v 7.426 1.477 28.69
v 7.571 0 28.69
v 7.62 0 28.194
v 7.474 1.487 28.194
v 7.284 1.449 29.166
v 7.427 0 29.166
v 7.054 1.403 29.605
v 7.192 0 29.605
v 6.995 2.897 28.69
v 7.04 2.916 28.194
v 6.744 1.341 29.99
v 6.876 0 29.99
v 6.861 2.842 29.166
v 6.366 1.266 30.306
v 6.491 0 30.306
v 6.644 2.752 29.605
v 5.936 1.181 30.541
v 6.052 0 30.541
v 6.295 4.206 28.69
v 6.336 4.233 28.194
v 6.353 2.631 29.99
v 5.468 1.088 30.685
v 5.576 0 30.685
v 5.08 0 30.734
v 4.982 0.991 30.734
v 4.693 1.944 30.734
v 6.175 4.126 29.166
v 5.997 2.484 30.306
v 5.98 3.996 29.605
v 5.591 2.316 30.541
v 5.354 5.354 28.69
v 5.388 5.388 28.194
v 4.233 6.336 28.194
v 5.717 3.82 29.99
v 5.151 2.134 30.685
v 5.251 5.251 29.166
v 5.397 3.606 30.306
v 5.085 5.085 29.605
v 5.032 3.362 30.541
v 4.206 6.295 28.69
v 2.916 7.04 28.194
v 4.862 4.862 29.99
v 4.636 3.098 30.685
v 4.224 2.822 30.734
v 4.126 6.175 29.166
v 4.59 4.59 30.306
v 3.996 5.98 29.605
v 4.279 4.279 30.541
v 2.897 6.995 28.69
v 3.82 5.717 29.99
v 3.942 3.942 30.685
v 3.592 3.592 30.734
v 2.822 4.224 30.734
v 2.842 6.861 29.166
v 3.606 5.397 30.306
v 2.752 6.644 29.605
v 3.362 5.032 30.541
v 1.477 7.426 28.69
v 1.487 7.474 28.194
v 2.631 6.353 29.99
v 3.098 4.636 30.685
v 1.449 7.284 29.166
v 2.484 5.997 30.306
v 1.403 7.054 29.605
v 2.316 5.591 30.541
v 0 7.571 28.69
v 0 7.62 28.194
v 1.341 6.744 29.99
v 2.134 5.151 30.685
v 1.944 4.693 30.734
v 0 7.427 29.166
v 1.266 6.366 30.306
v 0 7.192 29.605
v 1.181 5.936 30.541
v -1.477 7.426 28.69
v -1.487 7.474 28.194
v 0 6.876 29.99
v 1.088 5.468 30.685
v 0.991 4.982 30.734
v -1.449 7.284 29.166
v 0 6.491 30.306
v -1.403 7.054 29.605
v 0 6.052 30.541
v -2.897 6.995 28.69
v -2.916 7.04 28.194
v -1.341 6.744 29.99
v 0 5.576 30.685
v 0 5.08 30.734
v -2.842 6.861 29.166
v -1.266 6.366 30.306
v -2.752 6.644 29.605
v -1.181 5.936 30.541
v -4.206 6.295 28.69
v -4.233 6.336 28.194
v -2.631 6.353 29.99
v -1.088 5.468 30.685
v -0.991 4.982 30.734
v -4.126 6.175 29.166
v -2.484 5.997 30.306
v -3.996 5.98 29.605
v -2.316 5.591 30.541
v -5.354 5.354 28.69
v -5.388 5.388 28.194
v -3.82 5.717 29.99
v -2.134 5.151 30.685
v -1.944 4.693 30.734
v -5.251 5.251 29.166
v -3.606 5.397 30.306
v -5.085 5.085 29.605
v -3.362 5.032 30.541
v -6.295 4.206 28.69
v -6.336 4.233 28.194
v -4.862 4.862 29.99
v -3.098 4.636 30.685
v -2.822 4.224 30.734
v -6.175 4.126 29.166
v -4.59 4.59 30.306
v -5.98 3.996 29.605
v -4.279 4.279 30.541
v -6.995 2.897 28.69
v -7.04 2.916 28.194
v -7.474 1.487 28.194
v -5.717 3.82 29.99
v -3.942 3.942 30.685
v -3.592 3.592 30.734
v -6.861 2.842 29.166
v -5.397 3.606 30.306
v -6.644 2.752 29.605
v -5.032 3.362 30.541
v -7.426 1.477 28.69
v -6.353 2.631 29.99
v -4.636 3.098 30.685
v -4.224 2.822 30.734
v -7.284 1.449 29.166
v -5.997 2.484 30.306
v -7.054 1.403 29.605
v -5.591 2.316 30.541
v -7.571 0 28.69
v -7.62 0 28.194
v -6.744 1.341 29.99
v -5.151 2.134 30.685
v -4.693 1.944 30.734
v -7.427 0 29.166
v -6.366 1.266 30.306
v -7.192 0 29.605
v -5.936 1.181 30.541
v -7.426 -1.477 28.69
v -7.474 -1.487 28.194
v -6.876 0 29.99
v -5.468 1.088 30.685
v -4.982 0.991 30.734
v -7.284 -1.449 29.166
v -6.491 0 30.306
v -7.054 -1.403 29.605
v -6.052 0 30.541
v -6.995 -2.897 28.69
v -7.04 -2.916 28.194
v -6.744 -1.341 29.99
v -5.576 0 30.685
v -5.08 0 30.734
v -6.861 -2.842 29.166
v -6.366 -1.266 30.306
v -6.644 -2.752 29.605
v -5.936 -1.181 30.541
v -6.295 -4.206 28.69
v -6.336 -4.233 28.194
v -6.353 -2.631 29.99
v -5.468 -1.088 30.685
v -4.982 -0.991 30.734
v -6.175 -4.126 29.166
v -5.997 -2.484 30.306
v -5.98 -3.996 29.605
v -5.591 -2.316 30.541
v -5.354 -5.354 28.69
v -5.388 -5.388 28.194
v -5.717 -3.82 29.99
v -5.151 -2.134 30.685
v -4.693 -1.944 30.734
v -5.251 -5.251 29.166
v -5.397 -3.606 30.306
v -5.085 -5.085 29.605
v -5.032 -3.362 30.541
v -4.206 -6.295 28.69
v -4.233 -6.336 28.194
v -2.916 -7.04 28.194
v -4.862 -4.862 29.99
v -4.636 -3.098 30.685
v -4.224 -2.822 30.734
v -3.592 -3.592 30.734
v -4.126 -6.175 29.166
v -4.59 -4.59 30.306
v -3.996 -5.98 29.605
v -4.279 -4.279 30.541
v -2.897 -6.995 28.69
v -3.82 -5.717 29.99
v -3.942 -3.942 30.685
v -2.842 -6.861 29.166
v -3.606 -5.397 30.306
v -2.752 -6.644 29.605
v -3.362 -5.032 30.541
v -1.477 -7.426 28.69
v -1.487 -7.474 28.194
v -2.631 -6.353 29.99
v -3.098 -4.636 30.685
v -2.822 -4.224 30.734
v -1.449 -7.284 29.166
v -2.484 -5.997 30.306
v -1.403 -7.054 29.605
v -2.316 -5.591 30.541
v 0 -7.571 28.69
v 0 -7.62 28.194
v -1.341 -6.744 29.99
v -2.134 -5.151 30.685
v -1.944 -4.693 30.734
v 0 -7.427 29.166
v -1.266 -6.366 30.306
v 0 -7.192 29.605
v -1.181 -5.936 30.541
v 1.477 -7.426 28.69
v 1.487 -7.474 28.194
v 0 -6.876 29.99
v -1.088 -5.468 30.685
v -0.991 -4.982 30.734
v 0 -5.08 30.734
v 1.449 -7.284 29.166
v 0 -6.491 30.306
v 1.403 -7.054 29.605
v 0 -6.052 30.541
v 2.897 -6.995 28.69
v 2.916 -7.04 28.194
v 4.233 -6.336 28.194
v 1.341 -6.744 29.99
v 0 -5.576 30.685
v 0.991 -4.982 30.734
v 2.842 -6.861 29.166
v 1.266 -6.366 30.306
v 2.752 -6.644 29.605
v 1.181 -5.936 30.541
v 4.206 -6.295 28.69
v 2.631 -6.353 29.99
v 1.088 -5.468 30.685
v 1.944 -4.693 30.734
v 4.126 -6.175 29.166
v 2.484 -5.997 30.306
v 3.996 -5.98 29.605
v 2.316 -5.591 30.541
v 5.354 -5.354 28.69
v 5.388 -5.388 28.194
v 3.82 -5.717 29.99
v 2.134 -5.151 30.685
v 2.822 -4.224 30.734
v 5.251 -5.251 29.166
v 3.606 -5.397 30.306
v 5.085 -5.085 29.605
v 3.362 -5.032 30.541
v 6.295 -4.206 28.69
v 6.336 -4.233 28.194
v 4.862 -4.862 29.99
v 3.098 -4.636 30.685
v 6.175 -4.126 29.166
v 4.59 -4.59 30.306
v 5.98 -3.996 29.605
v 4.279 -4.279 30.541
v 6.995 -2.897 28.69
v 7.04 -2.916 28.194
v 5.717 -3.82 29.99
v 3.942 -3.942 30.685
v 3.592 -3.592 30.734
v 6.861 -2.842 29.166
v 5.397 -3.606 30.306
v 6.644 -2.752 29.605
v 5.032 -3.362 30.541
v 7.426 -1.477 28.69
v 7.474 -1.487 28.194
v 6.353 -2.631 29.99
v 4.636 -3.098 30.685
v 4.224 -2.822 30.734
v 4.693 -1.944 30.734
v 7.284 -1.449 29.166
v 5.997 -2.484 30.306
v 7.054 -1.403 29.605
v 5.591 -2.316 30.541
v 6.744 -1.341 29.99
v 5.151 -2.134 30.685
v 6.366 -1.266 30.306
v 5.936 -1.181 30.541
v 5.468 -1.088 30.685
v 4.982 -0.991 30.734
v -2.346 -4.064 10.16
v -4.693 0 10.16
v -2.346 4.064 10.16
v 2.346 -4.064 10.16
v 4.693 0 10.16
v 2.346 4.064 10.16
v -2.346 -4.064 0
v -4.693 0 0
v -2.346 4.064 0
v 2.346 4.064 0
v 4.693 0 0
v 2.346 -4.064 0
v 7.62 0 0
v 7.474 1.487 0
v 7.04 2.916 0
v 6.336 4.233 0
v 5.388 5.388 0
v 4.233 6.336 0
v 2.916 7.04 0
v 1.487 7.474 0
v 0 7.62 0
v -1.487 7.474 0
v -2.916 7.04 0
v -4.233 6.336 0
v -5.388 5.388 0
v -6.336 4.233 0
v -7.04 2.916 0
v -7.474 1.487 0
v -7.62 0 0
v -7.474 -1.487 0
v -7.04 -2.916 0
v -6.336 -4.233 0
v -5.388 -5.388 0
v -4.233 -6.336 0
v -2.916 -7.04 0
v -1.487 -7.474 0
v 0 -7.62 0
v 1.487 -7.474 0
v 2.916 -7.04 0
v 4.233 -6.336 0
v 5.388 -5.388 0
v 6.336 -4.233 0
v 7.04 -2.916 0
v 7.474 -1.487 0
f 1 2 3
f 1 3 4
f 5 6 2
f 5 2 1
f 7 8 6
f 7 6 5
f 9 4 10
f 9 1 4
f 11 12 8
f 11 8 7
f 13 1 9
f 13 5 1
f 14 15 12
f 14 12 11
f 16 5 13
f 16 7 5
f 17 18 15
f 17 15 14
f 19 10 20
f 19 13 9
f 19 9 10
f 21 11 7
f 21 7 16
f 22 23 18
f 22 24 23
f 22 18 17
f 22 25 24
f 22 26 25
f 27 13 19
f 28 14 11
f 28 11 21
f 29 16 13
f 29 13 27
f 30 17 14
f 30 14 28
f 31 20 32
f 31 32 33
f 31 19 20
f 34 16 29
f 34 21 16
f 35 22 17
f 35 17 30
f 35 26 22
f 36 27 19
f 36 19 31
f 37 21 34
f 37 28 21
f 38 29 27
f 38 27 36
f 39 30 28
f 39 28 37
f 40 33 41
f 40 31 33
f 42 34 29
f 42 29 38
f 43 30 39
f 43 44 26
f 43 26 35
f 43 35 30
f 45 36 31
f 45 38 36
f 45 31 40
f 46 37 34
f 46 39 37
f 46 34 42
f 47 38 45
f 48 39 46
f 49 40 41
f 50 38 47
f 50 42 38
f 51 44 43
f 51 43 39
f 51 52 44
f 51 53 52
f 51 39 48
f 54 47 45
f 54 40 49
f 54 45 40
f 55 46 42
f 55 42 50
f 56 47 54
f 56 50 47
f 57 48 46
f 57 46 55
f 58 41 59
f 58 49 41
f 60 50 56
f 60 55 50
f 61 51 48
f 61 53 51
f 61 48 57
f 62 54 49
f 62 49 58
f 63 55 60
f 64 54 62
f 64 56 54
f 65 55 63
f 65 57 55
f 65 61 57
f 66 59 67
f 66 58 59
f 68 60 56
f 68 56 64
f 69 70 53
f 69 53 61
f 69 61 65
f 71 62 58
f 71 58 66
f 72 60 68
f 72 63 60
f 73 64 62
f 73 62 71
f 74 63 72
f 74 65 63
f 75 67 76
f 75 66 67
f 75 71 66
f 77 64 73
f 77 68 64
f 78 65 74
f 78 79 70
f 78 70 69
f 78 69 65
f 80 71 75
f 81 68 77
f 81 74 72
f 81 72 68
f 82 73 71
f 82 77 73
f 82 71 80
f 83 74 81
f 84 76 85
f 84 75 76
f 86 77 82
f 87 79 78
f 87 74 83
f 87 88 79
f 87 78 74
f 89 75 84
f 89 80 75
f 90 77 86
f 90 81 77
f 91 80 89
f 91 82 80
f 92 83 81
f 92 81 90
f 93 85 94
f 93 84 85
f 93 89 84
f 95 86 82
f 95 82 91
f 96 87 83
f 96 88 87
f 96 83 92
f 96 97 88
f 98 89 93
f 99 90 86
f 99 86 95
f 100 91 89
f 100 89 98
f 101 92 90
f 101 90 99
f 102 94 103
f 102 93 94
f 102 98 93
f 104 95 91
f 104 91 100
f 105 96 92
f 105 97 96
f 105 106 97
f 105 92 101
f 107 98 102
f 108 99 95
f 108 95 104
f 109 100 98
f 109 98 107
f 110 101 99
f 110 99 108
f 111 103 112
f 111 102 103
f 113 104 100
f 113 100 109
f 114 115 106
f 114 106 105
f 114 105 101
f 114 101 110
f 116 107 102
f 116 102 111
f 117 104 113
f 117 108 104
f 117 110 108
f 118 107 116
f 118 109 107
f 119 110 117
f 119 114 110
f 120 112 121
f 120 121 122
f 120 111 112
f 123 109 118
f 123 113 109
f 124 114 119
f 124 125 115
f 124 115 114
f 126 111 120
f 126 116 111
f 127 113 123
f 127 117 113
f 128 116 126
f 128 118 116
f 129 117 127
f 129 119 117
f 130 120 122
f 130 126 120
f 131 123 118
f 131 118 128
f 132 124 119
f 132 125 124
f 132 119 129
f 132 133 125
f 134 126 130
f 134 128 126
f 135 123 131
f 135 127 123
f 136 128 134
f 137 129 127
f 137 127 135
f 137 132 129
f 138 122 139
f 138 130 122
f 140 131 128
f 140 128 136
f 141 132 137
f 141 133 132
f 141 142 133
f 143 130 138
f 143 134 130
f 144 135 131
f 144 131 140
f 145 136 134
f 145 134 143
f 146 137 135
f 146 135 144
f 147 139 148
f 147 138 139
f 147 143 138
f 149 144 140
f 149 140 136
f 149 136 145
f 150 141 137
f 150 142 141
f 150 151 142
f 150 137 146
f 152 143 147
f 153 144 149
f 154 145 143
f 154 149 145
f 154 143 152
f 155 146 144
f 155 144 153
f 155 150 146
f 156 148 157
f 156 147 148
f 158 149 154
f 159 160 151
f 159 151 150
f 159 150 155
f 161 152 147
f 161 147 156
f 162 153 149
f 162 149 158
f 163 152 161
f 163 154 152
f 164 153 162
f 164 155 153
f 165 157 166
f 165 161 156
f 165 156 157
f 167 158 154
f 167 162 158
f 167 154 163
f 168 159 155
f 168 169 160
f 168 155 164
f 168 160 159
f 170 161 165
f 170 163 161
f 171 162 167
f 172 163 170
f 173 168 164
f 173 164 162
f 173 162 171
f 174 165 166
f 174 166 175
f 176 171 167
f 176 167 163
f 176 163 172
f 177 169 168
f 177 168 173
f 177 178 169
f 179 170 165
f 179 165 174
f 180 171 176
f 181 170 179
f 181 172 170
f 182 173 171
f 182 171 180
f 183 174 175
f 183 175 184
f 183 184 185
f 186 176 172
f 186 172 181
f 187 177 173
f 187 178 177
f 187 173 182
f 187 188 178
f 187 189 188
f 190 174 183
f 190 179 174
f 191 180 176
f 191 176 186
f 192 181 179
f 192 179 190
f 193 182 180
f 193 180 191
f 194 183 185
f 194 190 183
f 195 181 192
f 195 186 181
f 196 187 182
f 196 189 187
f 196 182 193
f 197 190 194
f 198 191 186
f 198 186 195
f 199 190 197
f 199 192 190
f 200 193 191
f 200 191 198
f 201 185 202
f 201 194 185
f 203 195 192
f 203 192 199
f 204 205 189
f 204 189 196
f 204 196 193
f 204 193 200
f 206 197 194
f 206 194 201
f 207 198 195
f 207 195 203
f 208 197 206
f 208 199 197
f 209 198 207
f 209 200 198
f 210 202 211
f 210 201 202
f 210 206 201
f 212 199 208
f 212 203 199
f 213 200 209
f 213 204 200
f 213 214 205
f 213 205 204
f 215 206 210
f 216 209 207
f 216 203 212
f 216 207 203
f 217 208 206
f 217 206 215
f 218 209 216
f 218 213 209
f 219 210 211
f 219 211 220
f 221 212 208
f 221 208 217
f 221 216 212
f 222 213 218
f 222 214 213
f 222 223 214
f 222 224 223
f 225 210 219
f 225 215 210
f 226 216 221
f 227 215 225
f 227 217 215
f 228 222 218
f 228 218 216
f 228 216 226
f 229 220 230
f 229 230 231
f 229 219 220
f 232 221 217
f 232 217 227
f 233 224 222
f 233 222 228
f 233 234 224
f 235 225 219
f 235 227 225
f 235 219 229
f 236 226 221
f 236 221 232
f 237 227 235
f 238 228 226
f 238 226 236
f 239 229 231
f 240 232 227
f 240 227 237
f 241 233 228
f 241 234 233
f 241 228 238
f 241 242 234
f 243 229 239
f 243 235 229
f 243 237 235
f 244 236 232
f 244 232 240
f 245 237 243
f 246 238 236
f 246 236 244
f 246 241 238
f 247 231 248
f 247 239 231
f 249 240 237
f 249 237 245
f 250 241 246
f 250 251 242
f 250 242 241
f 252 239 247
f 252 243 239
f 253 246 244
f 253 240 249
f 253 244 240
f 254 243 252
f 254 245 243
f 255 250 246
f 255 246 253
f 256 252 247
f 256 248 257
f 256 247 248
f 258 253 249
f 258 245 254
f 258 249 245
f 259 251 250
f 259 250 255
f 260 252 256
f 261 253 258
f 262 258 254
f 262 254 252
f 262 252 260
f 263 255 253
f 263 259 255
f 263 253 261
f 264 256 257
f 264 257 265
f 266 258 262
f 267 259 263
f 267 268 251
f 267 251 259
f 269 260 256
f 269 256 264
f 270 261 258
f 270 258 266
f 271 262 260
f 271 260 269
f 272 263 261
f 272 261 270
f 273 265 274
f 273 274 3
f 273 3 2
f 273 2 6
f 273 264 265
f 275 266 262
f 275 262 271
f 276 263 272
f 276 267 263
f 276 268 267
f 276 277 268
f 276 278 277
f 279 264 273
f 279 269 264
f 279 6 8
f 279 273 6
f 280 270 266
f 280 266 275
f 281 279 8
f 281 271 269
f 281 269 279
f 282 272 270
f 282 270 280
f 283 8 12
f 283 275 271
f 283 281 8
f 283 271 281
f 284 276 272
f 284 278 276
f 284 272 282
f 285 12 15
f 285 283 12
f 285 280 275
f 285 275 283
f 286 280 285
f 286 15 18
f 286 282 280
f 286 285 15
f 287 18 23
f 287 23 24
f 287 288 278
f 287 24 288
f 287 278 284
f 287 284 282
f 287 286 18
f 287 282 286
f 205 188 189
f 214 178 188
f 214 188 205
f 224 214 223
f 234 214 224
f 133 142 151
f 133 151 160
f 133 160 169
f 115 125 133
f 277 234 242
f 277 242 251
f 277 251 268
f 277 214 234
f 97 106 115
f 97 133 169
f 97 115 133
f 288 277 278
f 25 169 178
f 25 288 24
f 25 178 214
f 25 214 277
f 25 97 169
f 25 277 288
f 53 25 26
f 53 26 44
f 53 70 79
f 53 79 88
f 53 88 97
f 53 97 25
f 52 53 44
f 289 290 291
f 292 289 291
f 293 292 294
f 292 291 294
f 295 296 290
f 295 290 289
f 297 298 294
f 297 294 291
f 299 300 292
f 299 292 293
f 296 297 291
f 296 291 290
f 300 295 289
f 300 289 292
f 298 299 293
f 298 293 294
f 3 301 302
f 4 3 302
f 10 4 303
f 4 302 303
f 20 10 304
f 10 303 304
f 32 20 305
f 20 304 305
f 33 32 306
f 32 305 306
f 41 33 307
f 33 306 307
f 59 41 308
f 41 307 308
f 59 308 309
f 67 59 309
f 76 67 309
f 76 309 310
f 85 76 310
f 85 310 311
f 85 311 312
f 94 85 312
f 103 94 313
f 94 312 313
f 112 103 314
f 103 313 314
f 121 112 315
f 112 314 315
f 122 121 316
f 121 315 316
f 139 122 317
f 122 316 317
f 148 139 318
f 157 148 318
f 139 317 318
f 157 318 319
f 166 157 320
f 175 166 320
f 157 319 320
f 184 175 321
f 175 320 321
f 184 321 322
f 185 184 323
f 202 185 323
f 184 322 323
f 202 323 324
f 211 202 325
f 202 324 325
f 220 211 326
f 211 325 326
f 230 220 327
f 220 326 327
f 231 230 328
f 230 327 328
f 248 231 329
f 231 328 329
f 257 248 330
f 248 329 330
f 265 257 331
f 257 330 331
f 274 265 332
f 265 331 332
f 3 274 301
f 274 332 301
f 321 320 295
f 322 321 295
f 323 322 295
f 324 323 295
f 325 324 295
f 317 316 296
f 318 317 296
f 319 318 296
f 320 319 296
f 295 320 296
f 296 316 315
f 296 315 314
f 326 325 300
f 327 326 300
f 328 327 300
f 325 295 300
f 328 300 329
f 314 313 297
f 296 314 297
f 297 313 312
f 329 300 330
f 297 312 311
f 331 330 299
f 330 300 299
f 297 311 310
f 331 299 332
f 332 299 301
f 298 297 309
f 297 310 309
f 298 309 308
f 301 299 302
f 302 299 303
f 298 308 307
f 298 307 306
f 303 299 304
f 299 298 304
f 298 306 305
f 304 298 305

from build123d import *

# Parameters (mm, degrees)
F0_R     = 7.62
F1_DEPTH = 30.734
F2_R     = 2.54
F4_DEPTH = 10.16


with BuildPart() as f1:
    # F0 (on Top) → F1 (new body)
    with BuildSketch(Plane.XY):
        Circle(F0_R)
    extrude(amount=F1_DEPTH)

    # F2
    f2_edges = [f1.edges().sort_by_distance(p)[0] for p in [
        (-7.62, 0, 30.734),
    ]]
    fillet(f2_edges, radius=F2_R)

    # F3 (on Top) → F4 (cut)
    with BuildSketch(Plane.XY):
        Polygon((2.346351, 4.064), (-2.346351, 4.064), (-4.692703, 0), (-2.346351, -4.064), (2.346351, -4.064), (4.692703, 0), align=None)
    extrude(amount=F4_DEPTH, mode=Mode.SUBTRACT)


solid = f1.part
